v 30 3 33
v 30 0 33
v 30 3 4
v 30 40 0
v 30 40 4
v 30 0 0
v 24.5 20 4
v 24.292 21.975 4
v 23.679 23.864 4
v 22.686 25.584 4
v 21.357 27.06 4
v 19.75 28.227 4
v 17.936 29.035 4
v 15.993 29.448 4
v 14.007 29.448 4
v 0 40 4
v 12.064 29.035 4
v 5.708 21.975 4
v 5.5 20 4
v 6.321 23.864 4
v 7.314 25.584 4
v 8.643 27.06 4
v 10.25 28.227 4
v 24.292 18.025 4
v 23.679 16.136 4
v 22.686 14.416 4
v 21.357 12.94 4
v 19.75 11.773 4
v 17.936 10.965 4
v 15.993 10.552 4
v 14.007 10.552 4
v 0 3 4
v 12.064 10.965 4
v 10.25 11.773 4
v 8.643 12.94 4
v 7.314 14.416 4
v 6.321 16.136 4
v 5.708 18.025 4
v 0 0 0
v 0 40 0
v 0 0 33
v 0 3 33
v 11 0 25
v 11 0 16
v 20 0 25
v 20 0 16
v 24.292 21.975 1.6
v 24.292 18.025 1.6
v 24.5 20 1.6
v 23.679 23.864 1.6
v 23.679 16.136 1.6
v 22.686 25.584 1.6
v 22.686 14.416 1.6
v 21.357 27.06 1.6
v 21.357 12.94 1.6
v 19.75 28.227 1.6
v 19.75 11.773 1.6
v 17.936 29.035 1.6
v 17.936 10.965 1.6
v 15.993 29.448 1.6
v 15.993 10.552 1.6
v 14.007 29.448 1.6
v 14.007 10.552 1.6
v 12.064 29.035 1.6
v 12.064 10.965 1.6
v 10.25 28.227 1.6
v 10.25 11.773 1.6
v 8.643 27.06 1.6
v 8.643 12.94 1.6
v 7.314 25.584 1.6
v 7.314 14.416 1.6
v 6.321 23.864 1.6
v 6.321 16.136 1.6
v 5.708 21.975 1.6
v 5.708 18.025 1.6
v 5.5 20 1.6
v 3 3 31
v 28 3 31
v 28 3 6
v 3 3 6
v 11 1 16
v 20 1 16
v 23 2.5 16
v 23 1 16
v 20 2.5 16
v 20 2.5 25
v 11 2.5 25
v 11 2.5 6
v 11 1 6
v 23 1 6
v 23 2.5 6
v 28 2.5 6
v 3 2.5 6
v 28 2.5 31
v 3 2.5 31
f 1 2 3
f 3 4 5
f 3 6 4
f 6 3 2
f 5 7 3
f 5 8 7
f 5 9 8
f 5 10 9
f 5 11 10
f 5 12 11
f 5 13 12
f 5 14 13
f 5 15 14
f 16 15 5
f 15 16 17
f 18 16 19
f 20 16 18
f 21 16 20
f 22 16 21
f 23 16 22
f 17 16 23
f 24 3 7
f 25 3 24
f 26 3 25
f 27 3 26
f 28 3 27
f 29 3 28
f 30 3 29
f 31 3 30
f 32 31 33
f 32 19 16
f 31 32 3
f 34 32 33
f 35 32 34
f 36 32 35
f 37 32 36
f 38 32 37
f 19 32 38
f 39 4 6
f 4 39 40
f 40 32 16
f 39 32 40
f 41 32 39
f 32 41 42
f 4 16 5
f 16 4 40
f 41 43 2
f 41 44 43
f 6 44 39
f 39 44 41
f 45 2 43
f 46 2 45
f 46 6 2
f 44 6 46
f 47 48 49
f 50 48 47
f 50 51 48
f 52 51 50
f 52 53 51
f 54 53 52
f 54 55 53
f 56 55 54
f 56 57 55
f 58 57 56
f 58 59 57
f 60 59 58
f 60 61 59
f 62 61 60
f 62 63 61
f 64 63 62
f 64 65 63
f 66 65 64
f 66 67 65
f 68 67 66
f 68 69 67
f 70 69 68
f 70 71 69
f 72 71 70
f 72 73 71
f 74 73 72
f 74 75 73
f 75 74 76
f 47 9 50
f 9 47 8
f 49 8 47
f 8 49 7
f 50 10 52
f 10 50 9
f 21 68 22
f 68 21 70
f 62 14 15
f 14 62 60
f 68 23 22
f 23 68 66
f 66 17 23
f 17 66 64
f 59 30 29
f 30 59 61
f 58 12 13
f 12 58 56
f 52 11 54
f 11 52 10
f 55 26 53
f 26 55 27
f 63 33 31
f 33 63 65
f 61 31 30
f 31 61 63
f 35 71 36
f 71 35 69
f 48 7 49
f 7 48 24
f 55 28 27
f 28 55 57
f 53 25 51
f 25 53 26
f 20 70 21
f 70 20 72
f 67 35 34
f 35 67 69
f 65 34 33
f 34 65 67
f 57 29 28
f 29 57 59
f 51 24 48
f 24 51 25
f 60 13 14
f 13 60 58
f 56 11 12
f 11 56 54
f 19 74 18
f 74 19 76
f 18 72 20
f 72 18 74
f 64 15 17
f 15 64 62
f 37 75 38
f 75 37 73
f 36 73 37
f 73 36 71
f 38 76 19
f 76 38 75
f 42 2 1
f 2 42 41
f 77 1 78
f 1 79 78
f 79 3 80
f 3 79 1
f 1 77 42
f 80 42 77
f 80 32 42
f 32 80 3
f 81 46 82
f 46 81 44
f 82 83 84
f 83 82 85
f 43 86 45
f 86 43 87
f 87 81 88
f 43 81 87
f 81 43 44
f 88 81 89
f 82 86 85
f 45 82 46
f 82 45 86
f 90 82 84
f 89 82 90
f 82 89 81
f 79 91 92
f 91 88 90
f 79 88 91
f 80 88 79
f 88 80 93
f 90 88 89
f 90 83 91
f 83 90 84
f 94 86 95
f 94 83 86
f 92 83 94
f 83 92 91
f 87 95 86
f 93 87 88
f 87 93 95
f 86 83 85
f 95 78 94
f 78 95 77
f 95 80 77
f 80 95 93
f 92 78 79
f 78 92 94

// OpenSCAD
//A very basic mount camera mount for the 16mm projector.
//There was, luckily, a flat, horizontal section of metal casing slightly below the lens.
//The mount is primarily held to this metal with a magnet (which sits in the derpression in the base.
//I also put a bit of double-sided tape between the mount and the base, just to add a bit of tackiness so it doesn't slide around.
//I use a rubber band to secure the camera to the mount
TOTAL_WIDTH=30;
BORDER_WIDTH=3;
BORDER_HEIGHT=30;

difference() {
    cube([TOTAL_WIDTH,40,4]);       //Base of mount
    translate([15,20,1.6]) cylinder(r=9.5, h=5); //Cutout for magnet
    }

//Presumably I had something in mind when I designed this upside down and flipped it around.
//But I couldn't tell you what it was.  Sorry.
translate([TOTAL_WIDTH,0,33]){   
    rotate([180,0,-90]){
        difference(){
            //Vertical Surface for Camera Mount
            translate([-BORDER_WIDTH,0,0]){ cube([BORDER_WIDTH,TOTAL_WIDTH,BORDER_HEIGHT]);}

            //Camera Opening
            translate([-BORDER_WIDTH-1,10,8]){cube([9,9,9]);} //The hole through the mount
            translate([-BORDER_WIDTH-1,7,17]){cube([3,12,10]);} //Cutout below lens for connector between sensor chip and PCB
            translate([-BORDER_WIDTH-1,2,2]){cube([BORDER_WIDTH/2,25,25]);} //Camera Seating area
        }
    }
}
